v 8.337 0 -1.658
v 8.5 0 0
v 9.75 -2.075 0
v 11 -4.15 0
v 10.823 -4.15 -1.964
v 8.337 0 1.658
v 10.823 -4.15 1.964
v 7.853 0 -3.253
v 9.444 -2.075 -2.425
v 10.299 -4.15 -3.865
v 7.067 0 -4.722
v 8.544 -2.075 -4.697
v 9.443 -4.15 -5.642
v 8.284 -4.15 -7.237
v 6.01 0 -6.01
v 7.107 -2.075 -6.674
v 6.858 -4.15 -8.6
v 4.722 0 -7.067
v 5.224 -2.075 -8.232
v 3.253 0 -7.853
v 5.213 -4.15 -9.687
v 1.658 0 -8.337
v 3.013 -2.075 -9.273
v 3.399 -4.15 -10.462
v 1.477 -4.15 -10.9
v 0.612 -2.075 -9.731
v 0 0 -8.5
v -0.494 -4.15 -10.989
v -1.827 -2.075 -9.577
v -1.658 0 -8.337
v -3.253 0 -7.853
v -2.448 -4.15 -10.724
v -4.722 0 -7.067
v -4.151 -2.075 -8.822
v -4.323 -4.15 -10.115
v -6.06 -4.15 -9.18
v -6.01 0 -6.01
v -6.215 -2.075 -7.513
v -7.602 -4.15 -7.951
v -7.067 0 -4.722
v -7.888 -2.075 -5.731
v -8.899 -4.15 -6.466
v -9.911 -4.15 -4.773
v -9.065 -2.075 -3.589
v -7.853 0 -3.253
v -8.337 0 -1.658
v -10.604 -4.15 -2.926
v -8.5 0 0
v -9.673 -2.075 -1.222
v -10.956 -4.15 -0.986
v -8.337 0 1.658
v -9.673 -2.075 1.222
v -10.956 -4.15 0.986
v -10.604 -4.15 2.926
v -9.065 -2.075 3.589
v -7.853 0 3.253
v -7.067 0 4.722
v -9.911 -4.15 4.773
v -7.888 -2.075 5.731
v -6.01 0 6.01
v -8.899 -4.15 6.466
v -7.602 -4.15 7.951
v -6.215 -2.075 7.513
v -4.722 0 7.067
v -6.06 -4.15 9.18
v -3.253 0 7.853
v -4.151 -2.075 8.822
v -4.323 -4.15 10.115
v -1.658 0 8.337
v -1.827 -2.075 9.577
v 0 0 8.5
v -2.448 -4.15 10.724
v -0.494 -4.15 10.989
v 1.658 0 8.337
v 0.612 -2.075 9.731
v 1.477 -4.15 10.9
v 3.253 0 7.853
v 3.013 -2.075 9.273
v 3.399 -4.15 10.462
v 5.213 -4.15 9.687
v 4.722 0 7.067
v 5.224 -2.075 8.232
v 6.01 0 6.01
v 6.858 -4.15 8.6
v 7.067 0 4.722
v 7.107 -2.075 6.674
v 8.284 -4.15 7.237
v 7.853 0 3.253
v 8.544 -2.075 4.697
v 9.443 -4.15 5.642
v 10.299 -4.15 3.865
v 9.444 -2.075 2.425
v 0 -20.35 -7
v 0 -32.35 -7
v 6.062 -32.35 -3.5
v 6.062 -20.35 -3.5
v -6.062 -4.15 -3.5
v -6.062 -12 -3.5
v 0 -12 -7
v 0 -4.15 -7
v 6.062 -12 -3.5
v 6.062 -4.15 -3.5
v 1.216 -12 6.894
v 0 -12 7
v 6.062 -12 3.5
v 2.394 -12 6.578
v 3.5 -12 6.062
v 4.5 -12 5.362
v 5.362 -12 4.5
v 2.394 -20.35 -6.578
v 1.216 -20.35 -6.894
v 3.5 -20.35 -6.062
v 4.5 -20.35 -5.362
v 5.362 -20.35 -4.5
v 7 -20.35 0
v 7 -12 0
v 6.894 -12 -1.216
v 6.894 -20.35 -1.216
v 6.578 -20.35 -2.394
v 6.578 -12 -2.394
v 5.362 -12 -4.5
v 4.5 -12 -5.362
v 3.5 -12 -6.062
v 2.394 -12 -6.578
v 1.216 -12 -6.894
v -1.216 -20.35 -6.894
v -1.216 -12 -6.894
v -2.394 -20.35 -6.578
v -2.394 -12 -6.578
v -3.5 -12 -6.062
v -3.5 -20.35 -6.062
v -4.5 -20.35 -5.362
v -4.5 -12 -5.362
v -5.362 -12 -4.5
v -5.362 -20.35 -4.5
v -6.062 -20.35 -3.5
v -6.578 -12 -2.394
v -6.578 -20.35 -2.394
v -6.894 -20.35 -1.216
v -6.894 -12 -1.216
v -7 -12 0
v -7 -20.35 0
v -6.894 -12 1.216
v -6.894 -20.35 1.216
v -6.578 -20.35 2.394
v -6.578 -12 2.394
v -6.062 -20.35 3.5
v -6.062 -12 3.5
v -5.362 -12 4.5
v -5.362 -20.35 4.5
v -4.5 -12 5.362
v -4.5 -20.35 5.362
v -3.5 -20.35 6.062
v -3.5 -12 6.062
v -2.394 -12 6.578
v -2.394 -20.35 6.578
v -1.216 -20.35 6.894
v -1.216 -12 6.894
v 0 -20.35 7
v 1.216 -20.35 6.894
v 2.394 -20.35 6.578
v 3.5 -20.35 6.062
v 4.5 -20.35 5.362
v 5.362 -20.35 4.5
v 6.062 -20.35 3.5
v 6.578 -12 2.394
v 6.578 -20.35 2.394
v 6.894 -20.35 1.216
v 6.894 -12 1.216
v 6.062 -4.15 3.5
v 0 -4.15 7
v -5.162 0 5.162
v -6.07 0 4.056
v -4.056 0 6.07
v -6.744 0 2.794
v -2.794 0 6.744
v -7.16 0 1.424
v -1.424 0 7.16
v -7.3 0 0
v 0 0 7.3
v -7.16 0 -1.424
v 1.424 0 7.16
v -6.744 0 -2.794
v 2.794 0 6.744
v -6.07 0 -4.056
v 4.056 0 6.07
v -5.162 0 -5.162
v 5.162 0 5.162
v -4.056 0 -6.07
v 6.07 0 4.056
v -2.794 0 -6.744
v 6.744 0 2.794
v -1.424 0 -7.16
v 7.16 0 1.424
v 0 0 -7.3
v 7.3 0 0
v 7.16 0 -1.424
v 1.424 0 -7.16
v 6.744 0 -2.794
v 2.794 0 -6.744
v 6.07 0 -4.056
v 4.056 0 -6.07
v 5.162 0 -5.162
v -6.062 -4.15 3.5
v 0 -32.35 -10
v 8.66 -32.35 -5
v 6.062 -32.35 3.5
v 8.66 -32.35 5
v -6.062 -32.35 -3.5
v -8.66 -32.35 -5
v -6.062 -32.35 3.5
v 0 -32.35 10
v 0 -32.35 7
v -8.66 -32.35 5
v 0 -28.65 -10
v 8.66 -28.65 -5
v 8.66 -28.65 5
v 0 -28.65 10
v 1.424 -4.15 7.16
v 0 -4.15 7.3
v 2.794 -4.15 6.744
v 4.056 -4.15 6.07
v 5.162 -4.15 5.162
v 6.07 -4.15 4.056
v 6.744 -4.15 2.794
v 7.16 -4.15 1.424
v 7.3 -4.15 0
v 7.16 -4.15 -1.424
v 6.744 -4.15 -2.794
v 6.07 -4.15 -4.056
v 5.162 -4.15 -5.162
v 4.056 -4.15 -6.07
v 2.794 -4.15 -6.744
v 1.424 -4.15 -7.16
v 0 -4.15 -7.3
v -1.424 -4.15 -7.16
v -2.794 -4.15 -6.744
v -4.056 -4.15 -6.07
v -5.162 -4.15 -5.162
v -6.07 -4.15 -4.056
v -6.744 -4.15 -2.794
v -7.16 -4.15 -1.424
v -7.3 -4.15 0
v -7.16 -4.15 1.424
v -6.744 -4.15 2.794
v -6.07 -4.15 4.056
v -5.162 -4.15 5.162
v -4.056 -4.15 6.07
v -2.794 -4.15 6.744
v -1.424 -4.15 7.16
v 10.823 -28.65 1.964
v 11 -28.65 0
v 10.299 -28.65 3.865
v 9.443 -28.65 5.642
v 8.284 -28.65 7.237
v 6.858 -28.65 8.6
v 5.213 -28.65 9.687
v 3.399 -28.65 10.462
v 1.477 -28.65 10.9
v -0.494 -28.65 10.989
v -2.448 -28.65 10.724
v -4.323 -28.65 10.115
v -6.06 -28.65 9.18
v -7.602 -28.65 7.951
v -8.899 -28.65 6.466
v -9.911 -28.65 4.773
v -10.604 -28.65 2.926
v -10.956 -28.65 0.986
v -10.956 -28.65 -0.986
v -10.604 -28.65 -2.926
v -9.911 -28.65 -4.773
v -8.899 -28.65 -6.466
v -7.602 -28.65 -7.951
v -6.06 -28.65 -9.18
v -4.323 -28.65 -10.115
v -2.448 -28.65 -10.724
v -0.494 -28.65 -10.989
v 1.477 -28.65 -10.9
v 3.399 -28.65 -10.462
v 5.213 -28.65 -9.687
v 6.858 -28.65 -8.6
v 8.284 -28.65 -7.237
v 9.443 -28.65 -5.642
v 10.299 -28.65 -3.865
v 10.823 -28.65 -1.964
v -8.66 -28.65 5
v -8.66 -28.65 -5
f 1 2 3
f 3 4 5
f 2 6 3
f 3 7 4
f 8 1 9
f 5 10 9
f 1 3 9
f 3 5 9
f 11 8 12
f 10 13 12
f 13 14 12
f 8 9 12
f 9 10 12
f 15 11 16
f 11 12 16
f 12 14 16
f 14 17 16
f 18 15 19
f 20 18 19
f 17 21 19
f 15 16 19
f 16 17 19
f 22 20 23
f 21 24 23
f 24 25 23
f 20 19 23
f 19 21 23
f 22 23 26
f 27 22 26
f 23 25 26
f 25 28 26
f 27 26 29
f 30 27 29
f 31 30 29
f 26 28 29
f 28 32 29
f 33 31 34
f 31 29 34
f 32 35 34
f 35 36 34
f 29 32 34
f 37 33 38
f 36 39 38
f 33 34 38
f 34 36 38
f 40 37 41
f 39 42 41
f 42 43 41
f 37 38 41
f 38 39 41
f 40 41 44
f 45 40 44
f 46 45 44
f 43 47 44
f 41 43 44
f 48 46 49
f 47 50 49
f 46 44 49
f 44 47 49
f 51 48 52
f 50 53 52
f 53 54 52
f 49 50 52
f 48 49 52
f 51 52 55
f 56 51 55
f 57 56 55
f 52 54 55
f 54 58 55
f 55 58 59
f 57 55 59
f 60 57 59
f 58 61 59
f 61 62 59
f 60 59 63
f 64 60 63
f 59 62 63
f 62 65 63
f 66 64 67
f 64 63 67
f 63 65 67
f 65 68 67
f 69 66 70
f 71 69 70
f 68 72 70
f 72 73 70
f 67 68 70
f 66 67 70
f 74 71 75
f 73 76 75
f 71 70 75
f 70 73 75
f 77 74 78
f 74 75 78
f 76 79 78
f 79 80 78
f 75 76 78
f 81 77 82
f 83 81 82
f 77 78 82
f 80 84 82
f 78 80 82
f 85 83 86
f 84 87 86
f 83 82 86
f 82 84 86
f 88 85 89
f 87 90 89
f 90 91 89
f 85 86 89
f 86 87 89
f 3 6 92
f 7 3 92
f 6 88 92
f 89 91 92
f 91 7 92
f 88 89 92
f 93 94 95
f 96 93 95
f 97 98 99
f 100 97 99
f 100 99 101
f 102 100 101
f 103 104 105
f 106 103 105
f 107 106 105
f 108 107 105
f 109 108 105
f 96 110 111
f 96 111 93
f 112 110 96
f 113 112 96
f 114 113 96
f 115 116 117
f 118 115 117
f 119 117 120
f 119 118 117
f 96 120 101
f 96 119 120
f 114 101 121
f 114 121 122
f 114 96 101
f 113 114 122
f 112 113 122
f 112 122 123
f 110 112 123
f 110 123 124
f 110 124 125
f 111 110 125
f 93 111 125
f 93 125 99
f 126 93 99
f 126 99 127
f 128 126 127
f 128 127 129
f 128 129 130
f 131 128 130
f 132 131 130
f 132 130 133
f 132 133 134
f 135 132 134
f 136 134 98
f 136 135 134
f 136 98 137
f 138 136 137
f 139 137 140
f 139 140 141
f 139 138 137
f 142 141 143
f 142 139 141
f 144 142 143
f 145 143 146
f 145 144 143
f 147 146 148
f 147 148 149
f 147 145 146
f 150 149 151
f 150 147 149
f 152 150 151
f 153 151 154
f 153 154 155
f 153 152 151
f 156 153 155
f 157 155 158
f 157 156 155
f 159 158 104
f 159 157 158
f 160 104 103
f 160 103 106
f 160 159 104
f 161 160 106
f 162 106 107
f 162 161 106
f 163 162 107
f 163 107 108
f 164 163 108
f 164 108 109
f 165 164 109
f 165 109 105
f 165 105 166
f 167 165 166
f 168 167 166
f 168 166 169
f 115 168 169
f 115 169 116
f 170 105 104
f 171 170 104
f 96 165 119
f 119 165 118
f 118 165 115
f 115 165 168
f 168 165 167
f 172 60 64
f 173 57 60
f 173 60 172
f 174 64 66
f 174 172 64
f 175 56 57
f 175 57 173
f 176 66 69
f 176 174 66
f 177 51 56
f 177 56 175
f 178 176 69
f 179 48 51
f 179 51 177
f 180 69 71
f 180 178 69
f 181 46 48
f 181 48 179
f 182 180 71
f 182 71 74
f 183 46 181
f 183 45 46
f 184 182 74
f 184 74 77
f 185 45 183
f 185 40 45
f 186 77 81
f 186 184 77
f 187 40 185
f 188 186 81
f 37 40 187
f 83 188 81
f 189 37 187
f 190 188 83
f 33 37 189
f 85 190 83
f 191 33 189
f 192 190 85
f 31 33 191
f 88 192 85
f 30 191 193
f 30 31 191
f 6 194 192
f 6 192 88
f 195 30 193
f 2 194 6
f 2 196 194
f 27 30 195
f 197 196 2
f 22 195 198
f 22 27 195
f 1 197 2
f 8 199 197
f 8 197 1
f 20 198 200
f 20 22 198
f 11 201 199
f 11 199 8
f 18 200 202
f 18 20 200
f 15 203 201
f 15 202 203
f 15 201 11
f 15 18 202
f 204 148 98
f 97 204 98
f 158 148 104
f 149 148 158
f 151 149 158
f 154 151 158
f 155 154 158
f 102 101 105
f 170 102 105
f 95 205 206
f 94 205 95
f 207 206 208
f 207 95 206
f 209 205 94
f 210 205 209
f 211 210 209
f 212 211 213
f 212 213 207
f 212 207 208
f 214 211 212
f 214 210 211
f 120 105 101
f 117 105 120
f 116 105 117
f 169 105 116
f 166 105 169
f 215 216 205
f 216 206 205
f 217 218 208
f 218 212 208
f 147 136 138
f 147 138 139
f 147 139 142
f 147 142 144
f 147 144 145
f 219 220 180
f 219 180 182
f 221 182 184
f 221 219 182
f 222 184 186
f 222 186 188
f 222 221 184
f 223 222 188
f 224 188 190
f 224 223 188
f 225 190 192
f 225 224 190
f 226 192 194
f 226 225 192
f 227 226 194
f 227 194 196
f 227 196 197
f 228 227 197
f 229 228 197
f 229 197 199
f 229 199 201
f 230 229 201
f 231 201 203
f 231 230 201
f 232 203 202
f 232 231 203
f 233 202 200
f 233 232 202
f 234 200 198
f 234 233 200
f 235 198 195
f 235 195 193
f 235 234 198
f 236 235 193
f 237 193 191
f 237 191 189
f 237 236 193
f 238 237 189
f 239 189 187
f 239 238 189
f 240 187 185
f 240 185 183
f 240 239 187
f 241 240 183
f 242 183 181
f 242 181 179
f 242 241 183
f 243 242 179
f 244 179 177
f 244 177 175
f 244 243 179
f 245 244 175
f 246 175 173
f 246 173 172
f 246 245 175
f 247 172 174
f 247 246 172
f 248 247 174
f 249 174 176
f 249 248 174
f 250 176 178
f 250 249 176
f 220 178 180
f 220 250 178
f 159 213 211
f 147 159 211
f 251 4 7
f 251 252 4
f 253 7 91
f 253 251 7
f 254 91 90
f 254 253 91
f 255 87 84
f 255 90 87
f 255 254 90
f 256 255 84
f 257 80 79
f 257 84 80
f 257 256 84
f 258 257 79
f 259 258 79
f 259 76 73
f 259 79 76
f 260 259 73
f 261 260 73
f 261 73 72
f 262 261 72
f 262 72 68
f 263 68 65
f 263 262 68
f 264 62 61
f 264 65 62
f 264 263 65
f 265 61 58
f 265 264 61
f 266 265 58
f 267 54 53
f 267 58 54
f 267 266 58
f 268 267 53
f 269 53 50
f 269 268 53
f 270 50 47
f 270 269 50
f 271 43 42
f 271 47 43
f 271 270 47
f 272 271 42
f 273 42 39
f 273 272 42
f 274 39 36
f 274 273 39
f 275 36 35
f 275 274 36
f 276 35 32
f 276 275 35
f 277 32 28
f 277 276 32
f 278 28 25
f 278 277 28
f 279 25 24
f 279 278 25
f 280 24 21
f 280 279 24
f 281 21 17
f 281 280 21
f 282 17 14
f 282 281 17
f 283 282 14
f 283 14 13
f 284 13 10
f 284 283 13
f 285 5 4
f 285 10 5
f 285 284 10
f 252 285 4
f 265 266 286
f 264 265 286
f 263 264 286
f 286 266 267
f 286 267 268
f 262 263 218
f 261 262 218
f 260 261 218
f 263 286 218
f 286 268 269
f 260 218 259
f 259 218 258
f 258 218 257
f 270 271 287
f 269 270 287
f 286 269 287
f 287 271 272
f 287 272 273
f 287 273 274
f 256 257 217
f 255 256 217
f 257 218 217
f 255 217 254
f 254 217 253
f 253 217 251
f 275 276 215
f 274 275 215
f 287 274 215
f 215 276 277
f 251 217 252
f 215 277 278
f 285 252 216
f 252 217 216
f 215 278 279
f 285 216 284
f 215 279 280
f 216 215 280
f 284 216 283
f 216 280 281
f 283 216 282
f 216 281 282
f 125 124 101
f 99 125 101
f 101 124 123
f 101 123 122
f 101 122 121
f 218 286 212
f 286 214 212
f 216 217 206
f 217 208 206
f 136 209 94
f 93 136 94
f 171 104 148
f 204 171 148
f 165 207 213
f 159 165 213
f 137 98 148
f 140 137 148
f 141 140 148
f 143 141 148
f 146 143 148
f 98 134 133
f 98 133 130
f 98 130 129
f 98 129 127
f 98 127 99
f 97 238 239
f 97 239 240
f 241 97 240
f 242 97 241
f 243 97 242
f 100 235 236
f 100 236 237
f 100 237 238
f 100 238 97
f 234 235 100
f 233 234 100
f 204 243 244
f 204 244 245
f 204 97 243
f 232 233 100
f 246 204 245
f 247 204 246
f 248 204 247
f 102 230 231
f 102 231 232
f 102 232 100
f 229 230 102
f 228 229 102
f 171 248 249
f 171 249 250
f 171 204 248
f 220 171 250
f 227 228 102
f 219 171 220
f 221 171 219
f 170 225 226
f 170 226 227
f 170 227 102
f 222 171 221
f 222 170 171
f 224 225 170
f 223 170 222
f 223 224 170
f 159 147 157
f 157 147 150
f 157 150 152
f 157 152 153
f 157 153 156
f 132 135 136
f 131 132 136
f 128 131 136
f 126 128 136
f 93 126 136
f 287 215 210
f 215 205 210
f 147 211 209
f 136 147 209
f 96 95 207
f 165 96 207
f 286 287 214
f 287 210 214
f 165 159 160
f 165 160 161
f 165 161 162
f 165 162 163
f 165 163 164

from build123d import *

# Parameters (mm, degrees)
SKETCH_1_R          = 8.5
SKETCH_2_R          = 11
SKETCH_4_R          = 11
CUT_EXTRUDE_1_DEPTH = 36.89599575
SKETCH_10_R         = 7
SKETCH_9_R          = 7
CUT_EXTRUDE_START   = -4.15
SKETCH_12_R         = 7.3
CUT_EXTRUDE_4_DEPTH = 4.15


with BuildPart() as part:
    # Эскиз1 → Loft 1 section 0
    with BuildSketch(Plane(origin=(0, 0, 0), x_dir=(1, 0, 0), z_dir=(0, 1, 0))):
        Circle(SKETCH_1_R)
    # Эскиз2 → Loft 1 section 1
    with BuildSketch(Plane(origin=(0, -4.15, 0), x_dir=(1, 0, 0), z_dir=(0, 1, 0))):
        Circle(SKETCH_2_R)
    loft()

    # Эскиз4 → section 1 of loft_2
    with BuildSketch(Plane(origin=(0, -28.65, 0), x_dir=(1, 0, 0), z_dir=(0, 1, 0)), mode=Mode.PRIVATE) as loft_2_s1:
        Circle(SKETCH_4_R)
    # loft up to a face of the part (loft_2)
    loft([Face(Wire([part.edges().sort_by_distance((-7.530018165, -4.15, 8.018654902))[0]])), loft_2_s1.sketch])

    # Эскиз5 → По сечениям3 section 0
    with BuildSketch(Plane(origin=(0, -28.65, 0), x_dir=(1, 0, 0), z_dir=(0, 1, 0))):
        with BuildLine():
            Line((0, 10), (-8.660254038, 5))
            Line((-8.660254038, 5), (-8.660254038, -5))
            Line((-8.660254038, -5), (0, -10))
            Line((0, -10), (8.660254038, -5))
            Line((8.660254038, -5), (8.660254038, 5))
            Line((8.660254038, 5), (0, 10))
        make_face()
    # Эскиз7 → По сечениям3 section 1
    with BuildSketch(Plane(origin=(0, -32.35, 0), x_dir=(1, 0, 0), z_dir=(0, 1, 0))):
        with BuildLine():
            Line((0, 10), (-8.660254038, 5))
            Line((-8.660254038, 5), (-8.660254038, -5))
            Line((-8.660254038, -5), (0, -10))
            Line((0, -10), (8.660254038, -5))
            Line((8.660254038, -5), (8.660254038, 5))
            Line((8.660254038, 5), (0, 10))
        make_face()
    loft()

    # Эскиз8 → Вырез-Вытянуть1 (cut, through all)
    with BuildSketch(Plane.XZ.offset(32.35)):
        Polygon((-6.062177826, 3.5), (-6.062177826, -3.5), (0, -7), (6.062177826, -3.5), (6.062177826, 3.5), (0, 7), align=None)
    extrude(amount=-CUT_EXTRUDE_1_DEPTH, mode=Mode.SUBTRACT)

    # Эскиз10 → Loft 1 2 section 0
    with BuildSketch(Plane(origin=(0, -12, 0), x_dir=(1, 0, 0), z_dir=(0, 1, 0))):
        Circle(SKETCH_10_R)
    # Эскиз9 → Loft 1 2 section 1
    with BuildSketch(Plane(origin=(0, -20.35, 0), x_dir=(1, 0, 0), z_dir=(0, 1, 0))):
        Circle(SKETCH_9_R)
    loft(mode=Mode.SUBTRACT)

    # Эскиз12 → Вырез-Вытянуть4 (cut)
    with BuildSketch(Plane(origin=(0, 0, 0), x_dir=(1, 0, 0), z_dir=(0, 1, 0)).offset(CUT_EXTRUDE_START)):
        with Locations(Location((0, 0, 0), (0, 0, 270))):
            Circle(SKETCH_12_R)
    extrude(amount=CUT_EXTRUDE_4_DEPTH, mode=Mode.SUBTRACT)


solid = part.part
